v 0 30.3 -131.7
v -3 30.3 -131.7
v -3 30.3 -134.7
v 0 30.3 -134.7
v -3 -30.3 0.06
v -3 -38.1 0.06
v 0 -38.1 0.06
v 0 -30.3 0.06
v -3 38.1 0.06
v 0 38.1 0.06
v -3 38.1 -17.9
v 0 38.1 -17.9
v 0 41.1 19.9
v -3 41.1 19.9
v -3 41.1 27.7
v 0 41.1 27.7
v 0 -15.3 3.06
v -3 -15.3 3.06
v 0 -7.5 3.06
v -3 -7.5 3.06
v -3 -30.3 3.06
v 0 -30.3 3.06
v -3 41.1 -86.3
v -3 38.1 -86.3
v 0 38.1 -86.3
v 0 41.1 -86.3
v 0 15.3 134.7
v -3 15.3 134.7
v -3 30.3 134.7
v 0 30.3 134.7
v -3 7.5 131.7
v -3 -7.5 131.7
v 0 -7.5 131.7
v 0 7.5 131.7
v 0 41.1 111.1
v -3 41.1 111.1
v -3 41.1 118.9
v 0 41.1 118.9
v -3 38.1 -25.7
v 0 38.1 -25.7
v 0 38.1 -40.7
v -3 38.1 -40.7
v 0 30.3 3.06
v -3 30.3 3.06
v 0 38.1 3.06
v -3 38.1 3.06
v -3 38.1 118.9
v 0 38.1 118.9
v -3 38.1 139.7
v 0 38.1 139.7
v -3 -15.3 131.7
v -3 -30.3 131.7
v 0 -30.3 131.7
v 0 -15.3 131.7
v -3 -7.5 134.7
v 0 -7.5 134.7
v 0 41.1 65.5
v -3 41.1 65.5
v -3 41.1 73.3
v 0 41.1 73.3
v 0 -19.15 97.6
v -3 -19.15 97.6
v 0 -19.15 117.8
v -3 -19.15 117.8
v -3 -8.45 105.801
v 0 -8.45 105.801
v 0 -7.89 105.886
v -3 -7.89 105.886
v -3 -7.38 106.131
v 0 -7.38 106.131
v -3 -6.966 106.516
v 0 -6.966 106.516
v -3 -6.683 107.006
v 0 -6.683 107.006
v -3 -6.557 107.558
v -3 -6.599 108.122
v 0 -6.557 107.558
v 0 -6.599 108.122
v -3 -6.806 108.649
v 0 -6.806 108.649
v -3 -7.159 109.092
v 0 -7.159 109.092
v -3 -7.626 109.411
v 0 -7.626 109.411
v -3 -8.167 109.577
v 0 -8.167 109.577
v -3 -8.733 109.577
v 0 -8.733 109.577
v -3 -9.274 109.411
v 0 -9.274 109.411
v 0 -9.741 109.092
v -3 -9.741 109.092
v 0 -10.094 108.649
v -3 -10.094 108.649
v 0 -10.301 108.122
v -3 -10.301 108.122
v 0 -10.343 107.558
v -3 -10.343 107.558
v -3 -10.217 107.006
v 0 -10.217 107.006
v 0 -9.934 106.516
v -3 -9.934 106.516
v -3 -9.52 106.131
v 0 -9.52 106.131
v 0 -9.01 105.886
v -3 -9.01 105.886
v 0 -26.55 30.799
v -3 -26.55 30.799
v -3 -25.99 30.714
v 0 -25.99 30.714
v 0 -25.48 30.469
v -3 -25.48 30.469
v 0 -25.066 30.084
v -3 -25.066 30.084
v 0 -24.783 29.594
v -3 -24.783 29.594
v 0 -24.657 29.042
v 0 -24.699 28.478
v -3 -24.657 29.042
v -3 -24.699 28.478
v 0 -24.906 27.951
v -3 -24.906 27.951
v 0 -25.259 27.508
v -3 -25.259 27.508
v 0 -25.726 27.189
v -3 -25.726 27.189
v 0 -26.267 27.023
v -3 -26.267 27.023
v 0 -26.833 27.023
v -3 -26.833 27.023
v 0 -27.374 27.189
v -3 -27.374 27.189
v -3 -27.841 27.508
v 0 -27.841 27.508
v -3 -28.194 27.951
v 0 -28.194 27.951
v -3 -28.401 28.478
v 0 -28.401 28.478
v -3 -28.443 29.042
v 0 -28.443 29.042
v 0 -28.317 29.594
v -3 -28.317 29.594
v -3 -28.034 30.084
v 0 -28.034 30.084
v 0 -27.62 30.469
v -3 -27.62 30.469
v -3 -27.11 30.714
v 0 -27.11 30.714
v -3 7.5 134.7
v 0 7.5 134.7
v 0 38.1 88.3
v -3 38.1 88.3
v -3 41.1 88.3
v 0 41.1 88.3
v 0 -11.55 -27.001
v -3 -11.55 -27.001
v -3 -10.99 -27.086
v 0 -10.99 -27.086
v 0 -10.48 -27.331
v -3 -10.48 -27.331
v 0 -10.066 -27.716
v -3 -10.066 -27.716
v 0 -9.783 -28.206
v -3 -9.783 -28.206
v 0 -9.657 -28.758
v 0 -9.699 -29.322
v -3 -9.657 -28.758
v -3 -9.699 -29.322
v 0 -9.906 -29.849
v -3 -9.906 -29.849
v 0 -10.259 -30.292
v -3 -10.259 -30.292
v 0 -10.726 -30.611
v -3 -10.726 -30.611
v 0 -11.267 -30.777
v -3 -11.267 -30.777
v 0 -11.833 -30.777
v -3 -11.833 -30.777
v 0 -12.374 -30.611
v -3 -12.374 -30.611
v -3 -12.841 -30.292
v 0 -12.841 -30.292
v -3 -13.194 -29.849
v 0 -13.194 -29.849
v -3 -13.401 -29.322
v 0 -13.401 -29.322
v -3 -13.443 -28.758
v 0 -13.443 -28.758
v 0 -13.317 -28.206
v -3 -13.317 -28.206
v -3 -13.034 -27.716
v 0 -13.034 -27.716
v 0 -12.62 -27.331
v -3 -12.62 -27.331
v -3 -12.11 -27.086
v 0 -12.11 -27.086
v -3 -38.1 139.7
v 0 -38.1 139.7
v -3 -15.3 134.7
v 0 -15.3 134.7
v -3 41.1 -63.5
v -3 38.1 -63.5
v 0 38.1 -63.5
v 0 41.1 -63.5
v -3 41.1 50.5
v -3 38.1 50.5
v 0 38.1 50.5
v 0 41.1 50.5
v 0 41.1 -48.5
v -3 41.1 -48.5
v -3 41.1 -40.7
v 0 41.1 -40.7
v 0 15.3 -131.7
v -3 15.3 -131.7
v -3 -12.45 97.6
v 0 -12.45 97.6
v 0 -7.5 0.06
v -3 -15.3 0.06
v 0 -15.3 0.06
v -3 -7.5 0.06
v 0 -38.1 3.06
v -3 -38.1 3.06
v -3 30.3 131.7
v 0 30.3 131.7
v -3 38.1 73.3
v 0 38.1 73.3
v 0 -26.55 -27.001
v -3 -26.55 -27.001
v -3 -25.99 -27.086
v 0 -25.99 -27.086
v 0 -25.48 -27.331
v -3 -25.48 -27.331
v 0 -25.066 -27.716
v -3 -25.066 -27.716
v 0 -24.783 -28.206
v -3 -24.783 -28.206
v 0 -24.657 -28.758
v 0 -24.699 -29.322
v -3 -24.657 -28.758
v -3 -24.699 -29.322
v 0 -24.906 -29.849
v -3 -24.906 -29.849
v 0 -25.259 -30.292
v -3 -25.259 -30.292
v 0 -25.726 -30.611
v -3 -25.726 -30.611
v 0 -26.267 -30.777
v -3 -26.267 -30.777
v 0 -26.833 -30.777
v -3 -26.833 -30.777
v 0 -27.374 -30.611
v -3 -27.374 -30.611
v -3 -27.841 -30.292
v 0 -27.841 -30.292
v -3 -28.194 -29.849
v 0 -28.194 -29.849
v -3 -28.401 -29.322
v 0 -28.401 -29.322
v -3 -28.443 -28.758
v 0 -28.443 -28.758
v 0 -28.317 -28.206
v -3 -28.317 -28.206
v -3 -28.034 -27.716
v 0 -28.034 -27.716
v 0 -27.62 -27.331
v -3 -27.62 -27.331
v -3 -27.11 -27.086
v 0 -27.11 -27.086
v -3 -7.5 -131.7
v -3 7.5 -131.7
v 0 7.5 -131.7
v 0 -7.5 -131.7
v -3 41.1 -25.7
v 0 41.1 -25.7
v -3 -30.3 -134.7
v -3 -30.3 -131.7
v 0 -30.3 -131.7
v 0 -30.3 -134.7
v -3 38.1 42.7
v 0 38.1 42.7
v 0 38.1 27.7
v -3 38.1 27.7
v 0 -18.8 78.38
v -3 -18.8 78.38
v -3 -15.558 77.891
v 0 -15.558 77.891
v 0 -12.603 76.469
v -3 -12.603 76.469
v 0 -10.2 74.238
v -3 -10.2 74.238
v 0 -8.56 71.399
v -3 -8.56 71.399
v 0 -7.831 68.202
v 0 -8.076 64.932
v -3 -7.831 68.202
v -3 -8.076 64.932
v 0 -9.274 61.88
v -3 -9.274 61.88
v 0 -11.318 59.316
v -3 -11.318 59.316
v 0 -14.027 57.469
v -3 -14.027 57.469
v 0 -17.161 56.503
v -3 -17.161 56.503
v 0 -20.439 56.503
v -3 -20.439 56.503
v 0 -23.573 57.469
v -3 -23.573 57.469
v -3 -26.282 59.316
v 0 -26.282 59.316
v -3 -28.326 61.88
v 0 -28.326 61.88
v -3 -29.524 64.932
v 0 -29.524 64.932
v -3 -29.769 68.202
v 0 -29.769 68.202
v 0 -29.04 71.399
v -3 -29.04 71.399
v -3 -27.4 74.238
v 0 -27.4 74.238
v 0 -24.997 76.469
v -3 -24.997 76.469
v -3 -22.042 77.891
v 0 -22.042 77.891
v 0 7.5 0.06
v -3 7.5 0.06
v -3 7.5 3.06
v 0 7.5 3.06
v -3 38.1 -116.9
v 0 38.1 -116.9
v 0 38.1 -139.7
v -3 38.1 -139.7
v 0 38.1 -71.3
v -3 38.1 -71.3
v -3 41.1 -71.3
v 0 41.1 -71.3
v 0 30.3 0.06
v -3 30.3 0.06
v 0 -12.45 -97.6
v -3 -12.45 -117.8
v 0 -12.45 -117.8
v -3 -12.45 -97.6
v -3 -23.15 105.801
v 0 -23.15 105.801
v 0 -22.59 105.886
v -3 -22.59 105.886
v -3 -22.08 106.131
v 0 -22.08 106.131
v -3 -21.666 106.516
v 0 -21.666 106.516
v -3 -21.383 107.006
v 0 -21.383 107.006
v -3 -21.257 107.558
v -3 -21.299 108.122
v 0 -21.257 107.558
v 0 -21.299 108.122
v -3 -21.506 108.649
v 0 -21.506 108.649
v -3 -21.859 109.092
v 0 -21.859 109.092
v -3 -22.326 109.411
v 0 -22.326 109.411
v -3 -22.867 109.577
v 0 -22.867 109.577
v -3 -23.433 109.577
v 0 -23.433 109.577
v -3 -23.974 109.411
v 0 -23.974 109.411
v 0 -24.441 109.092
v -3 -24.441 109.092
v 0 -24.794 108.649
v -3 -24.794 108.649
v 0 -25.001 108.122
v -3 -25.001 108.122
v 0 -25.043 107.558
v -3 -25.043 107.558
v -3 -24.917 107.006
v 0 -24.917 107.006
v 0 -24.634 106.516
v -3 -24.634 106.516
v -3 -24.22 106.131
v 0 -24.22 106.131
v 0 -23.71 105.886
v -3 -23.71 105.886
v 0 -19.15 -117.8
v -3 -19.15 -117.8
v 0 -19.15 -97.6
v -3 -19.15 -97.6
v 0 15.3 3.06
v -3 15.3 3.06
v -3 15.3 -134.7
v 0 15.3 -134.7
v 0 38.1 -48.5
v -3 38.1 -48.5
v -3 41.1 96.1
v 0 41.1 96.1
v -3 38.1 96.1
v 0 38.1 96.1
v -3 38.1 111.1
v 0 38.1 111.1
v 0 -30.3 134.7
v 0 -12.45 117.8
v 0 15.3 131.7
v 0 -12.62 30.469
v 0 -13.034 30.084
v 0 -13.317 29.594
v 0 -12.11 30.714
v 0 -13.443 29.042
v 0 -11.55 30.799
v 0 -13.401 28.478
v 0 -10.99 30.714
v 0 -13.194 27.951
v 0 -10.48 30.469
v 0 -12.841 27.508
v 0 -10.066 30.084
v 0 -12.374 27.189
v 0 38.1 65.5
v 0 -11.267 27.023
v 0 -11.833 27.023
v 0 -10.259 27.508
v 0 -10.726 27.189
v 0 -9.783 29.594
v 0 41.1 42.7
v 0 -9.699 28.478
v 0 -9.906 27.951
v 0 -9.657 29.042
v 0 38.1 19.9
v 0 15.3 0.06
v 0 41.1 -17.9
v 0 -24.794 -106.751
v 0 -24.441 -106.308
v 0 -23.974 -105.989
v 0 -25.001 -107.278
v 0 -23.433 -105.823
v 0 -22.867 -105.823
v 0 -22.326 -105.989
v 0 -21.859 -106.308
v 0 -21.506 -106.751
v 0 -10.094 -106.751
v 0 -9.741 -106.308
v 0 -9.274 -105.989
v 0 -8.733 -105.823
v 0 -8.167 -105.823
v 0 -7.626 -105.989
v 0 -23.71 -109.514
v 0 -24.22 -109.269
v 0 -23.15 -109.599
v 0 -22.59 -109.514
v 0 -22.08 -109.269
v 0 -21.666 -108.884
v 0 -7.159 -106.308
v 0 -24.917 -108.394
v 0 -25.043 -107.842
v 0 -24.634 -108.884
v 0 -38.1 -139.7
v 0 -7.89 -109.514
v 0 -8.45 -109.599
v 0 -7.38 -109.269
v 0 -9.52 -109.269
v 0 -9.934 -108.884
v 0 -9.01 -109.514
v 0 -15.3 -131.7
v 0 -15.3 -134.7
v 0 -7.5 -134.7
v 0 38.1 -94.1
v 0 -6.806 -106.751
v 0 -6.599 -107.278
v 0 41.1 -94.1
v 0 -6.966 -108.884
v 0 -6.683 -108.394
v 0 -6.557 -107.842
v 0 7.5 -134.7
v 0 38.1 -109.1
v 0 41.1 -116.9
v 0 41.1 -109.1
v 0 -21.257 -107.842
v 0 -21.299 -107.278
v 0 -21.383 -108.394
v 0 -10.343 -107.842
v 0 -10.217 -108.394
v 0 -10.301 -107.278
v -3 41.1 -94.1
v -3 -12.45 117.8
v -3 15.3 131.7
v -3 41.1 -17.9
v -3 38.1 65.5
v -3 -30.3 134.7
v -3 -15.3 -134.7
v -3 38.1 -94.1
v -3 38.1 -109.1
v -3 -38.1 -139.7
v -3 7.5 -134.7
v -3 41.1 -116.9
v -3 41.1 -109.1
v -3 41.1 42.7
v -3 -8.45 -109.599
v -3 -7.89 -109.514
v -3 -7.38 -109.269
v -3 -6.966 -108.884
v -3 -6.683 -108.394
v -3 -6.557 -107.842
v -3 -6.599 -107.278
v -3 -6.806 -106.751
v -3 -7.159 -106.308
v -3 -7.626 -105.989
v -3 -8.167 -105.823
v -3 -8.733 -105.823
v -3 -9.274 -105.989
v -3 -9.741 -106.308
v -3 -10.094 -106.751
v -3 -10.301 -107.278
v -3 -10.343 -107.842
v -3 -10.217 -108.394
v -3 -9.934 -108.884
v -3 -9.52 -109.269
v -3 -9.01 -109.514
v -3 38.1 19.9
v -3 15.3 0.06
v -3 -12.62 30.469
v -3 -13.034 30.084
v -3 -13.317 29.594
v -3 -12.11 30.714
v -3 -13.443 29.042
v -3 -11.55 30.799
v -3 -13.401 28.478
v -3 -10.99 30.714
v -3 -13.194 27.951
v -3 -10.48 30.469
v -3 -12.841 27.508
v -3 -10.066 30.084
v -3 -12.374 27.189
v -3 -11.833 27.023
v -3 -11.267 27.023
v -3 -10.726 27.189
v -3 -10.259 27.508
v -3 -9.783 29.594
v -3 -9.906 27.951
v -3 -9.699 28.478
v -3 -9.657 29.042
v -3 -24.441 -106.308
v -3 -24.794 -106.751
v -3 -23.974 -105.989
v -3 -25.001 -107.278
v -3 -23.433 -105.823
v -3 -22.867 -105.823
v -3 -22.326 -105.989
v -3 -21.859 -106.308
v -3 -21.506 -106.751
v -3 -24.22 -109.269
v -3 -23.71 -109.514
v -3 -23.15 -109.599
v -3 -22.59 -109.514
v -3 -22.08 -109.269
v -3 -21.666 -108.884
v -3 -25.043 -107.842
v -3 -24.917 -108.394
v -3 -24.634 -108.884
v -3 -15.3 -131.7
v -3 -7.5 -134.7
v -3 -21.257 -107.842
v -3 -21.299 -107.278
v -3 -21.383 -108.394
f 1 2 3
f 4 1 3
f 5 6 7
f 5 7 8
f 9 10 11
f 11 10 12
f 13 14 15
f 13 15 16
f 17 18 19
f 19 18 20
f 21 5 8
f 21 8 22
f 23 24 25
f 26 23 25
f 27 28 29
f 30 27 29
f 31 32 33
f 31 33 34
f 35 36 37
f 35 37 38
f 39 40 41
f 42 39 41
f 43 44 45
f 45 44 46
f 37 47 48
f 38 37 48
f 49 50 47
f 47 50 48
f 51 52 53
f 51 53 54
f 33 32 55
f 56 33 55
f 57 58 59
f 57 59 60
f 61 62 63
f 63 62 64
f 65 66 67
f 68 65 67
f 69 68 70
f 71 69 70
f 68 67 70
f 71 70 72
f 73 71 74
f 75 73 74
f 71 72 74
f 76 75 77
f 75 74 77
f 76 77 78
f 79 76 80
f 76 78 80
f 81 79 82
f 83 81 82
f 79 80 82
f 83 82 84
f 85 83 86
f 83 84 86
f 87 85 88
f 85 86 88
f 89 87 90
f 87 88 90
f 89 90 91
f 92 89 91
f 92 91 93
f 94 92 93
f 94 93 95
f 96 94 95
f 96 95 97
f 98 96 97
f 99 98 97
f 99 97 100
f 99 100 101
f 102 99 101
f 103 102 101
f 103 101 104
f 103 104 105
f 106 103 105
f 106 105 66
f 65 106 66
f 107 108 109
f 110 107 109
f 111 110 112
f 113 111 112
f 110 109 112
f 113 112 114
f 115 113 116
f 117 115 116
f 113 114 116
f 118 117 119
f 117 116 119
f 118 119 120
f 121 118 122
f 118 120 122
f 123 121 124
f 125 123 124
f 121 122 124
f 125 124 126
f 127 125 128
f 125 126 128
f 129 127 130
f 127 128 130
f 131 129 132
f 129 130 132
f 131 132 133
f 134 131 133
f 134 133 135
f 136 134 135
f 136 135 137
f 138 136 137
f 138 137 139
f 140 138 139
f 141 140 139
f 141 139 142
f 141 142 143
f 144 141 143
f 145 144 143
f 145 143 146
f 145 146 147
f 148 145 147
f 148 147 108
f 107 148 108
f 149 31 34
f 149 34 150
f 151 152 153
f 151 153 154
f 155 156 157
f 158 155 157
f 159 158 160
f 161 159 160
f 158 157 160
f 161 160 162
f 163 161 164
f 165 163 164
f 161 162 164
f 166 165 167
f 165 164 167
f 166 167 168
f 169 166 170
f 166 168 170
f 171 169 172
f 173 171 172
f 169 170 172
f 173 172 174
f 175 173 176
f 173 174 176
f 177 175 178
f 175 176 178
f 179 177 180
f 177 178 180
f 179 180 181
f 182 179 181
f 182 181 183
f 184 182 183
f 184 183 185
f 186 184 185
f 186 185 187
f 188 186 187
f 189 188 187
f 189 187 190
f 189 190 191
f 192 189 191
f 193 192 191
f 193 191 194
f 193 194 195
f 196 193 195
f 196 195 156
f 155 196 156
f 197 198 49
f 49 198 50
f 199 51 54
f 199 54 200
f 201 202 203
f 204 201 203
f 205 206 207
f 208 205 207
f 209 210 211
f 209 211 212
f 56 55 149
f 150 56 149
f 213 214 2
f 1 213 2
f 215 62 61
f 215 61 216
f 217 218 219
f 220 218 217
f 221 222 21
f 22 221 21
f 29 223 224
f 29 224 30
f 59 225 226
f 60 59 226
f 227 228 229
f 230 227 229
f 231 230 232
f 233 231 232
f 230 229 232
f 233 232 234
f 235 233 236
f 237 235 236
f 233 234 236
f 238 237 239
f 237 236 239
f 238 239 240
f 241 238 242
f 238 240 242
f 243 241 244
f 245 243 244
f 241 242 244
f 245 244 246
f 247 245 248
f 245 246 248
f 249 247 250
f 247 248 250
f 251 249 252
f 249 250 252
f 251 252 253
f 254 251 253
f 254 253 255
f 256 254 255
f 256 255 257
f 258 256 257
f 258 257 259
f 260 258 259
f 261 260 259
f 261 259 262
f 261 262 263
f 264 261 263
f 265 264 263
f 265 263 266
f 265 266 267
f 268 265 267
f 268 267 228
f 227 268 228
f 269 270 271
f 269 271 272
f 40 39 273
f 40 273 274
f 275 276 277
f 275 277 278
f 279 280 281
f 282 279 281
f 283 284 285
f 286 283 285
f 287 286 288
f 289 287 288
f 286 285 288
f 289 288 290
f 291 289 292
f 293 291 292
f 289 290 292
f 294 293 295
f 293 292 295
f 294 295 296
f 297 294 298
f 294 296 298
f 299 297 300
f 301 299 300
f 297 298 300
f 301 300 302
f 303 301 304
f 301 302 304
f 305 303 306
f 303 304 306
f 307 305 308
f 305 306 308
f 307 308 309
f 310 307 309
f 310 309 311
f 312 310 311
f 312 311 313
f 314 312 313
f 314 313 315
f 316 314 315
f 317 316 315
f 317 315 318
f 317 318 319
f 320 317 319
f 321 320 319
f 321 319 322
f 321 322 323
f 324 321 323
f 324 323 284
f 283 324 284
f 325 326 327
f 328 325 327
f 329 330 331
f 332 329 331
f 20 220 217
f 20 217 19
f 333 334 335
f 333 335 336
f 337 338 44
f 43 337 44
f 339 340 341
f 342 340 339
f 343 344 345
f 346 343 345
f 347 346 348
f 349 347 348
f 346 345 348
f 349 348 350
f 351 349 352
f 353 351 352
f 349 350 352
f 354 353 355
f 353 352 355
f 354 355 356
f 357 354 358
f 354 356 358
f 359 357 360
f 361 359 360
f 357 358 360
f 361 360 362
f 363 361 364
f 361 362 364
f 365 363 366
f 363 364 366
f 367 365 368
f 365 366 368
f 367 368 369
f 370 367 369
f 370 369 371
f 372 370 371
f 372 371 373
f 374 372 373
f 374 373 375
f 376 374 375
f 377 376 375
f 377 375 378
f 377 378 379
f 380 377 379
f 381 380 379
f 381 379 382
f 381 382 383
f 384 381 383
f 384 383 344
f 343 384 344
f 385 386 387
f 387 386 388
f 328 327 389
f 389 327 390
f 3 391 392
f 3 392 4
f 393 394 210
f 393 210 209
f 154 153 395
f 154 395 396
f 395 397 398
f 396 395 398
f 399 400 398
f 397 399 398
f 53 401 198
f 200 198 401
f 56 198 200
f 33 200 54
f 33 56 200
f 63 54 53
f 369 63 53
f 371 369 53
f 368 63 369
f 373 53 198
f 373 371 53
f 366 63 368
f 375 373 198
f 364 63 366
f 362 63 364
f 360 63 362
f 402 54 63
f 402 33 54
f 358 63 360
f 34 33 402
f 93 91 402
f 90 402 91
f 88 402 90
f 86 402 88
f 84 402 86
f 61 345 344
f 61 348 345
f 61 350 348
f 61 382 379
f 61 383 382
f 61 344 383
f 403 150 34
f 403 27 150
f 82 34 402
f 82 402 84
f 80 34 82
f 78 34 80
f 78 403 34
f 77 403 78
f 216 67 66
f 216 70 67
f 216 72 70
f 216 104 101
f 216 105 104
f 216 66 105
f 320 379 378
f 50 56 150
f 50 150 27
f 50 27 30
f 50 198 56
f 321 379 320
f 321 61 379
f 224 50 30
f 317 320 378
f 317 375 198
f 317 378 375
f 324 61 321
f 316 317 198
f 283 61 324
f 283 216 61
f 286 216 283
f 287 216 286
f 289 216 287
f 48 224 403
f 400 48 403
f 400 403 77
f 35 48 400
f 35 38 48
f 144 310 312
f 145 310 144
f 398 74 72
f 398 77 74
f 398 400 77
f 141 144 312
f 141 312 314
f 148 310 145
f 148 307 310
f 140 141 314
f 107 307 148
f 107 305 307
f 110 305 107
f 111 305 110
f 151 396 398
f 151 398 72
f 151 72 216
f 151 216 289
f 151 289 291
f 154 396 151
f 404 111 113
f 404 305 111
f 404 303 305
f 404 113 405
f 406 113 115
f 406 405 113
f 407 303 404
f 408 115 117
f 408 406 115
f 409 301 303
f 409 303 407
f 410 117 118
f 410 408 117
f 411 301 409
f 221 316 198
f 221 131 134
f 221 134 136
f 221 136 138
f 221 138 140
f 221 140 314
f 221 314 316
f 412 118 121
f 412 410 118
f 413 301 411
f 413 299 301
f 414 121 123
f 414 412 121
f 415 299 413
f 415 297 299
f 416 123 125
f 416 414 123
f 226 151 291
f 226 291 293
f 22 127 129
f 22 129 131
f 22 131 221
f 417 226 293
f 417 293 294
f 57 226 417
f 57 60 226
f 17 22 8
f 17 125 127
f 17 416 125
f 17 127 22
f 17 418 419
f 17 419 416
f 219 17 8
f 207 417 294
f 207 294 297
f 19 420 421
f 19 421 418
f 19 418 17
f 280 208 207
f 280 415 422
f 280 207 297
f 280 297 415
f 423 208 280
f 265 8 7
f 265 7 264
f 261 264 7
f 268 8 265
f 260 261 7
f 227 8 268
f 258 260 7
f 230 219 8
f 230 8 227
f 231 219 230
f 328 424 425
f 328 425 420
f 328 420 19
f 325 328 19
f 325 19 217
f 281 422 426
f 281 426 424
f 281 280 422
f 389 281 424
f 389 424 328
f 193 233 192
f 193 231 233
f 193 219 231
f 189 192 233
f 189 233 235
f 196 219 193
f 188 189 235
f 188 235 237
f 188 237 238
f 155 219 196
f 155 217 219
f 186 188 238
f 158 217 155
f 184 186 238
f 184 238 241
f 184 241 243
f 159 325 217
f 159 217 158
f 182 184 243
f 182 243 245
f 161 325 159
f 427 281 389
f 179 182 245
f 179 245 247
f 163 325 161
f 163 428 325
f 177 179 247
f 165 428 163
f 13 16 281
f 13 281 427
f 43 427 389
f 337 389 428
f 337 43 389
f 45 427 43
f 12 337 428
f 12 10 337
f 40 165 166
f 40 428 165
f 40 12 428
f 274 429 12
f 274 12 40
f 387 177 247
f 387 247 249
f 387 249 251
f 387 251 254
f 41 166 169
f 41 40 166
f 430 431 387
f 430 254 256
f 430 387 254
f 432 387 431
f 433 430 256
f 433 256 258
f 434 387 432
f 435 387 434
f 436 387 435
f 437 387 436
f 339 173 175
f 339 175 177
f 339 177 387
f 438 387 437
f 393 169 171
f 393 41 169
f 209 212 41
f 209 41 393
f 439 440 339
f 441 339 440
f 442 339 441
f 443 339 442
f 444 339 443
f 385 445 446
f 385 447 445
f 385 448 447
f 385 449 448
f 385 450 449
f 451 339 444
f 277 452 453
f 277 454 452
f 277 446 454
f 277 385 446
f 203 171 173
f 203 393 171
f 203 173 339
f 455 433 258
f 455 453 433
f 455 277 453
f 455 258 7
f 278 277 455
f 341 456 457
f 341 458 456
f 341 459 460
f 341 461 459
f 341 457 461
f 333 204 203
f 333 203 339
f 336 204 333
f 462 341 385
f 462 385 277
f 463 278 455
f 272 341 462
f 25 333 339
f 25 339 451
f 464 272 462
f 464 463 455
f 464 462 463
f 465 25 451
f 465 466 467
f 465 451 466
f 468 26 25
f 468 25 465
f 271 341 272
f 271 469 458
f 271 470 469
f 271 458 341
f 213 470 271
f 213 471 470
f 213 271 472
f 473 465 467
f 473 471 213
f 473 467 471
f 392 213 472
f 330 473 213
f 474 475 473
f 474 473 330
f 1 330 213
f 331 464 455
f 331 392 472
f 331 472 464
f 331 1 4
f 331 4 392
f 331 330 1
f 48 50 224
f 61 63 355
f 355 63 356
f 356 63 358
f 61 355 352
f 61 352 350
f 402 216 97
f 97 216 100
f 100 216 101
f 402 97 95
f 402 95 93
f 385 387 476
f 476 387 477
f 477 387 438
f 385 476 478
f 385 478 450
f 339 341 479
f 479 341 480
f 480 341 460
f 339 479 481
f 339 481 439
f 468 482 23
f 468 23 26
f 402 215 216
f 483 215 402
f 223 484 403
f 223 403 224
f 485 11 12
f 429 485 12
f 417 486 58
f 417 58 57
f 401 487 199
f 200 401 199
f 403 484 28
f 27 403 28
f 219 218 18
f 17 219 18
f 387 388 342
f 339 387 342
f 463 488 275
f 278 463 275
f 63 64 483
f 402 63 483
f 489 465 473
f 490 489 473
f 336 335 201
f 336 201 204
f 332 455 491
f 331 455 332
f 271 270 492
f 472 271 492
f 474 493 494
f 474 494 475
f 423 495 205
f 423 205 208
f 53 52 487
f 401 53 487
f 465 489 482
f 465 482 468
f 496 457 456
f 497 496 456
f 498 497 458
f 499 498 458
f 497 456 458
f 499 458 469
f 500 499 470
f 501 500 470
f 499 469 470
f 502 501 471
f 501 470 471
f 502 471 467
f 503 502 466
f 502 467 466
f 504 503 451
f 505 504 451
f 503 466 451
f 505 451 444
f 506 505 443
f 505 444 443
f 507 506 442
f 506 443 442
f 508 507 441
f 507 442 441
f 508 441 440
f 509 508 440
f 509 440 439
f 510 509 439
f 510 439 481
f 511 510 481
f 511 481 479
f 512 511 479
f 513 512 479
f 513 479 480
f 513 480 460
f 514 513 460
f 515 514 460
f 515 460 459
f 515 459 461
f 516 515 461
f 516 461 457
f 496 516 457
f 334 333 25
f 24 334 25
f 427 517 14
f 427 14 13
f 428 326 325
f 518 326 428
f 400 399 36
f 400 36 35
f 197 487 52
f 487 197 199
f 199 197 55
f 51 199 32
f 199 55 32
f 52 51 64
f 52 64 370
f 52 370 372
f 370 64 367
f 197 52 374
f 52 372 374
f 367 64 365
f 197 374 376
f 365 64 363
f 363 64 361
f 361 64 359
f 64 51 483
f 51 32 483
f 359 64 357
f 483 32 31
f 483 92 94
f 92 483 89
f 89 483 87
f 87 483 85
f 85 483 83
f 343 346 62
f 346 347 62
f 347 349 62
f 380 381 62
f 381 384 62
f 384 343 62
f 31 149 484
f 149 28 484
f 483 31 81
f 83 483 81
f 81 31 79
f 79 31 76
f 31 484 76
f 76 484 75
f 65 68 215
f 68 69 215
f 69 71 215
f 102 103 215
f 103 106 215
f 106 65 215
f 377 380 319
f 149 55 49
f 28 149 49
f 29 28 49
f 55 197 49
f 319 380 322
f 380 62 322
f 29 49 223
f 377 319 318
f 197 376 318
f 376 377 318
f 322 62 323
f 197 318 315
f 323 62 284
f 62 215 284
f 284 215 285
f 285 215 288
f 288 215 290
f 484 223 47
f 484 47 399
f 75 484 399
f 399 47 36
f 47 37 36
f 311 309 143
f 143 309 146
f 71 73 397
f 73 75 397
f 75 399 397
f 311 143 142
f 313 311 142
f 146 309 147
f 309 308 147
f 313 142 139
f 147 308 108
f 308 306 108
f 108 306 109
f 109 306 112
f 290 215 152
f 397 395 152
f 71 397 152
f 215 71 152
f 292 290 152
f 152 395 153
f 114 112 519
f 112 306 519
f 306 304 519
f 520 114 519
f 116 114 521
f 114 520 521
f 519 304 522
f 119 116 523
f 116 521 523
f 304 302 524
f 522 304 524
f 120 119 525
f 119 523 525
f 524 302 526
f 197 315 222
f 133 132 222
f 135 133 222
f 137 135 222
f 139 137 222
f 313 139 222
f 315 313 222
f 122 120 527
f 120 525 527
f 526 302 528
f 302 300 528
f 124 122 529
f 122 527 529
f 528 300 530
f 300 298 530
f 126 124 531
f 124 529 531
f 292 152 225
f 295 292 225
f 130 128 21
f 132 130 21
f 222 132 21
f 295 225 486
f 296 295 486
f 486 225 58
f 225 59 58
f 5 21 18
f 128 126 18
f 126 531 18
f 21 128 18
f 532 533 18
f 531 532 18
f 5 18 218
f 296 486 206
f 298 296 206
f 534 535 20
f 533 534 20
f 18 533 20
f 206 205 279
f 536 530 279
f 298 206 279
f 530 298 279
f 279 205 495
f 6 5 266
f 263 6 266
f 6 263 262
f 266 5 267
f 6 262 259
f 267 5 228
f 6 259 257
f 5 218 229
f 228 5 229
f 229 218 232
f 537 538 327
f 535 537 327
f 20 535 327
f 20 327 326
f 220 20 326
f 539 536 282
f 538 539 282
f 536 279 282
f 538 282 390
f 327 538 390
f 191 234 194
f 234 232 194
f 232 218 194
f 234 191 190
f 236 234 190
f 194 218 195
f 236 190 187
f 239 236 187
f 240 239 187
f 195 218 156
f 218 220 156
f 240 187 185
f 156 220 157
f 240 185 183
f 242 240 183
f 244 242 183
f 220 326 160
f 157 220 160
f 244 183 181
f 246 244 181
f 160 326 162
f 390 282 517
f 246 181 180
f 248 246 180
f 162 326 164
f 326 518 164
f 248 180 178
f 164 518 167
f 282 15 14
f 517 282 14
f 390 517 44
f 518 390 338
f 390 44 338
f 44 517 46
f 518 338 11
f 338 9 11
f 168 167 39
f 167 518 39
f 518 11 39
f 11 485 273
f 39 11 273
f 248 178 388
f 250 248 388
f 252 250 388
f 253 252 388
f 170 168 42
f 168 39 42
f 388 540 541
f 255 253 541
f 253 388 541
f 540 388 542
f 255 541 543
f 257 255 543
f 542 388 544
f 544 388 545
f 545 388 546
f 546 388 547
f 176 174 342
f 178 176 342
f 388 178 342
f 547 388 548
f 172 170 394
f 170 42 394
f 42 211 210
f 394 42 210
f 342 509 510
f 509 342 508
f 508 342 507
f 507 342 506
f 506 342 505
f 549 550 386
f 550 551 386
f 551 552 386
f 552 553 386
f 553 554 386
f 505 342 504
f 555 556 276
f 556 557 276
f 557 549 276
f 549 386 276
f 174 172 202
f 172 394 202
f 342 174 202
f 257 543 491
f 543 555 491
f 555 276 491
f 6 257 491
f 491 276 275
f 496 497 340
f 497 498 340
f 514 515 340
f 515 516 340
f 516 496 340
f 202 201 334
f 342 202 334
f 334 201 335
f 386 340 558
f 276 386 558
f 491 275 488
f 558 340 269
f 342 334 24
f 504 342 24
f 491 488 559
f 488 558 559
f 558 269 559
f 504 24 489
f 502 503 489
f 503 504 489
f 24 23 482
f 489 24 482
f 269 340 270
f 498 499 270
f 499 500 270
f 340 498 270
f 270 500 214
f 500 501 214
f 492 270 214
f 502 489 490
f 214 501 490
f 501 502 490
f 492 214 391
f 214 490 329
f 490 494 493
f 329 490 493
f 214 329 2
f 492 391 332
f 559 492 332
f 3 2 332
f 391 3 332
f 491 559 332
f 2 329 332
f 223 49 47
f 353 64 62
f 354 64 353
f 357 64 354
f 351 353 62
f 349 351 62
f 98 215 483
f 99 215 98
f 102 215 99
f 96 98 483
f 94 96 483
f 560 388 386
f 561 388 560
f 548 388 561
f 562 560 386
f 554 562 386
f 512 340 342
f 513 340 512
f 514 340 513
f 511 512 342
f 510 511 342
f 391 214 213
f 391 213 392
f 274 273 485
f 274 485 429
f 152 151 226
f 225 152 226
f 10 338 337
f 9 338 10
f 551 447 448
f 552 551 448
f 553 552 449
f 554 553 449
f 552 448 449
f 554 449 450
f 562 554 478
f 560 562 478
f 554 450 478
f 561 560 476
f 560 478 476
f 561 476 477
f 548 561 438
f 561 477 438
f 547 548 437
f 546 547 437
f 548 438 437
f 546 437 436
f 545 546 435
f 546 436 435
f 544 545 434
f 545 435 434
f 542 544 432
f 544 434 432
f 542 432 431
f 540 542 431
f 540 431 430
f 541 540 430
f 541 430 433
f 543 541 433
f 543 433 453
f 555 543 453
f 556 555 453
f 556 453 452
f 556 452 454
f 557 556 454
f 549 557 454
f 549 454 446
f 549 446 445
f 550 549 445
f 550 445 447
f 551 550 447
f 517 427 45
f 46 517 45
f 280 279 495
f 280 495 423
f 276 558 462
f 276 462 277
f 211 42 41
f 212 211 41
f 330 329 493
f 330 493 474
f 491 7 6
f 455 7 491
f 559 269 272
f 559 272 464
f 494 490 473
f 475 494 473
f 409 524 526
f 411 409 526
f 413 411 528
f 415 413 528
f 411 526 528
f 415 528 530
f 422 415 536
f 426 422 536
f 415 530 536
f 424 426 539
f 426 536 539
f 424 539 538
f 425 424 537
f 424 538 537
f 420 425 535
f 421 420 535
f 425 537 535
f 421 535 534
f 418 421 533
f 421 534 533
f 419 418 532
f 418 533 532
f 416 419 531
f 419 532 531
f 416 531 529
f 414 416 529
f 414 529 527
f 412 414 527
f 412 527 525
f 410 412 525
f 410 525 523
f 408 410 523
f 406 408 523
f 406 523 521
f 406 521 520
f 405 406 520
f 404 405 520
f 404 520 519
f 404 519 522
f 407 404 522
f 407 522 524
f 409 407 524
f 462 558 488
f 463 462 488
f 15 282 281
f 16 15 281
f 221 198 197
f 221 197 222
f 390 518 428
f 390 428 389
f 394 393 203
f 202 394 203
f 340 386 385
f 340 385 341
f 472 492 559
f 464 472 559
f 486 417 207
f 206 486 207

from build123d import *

# Parameters (mm, degrees)
SKETCH1_W               = 279.4
SKETCH1_H               = 76.2
BOSS_EXTRUDE1_DEPTH     = 3
SKETCH3_W               = 3
SKETCH3_H               = 15
CUT_EXTRUDE1_DEPTH      = 145.833352512
LPATTERN1_COUNT         = 3
LPATTERN1_PITCH         = 22.8
MIRROR1_COPY_1_SKETCH_W = 3
MIRROR1_COPY_1_SKETCH_H = 15
MIRROR1_COPY_1_DEPTH    = 145.833352512
MIRROR1_COPY_2_SKETCH_W = 3
MIRROR1_COPY_2_SKETCH_H = 15
MIRROR1_COPY_2_DEPTH    = 145.833352512
SKETCH6_W               = 3
SKETCH6_H               = 7.8
CUT_EXTRUDE2_DEPTH      = 145.833352512
LPATTERN2_COUNT         = 4
LPATTERN2_PITCH         = 22.8
SKETCH8_W               = 3
SKETCH8_H               = 7.8
BOSS_EXTRUDE2_DEPTH     = 3
LPATTERN4_COUNT         = 11
LPATTERN4_PITCH         = 22.8
SKETCH9_R               = 11
CUT_EXTRUDE3_DEPTH      = 146.651295909
F_6_CLEARANCE_HOLE1_D   = 3.7973
CUT_EXTRUDE4_REACH      = 147.651
SKETCH12_W              = 20.2
SKETCH12_H              = 6.7
F_6_CLEARANCE_HOLE2_D   = 3.7973


with BuildPart() as part:
    # Sketch1 → Boss-Extrude1 (new body)
    with BuildSketch(Plane(origin=(0, 0, 0), x_dir=(0, 0, -1), z_dir=(1, 0, 0))):
        Rectangle(SKETCH1_W, SKETCH1_H)
    extrude(amount=-BOSS_EXTRUDE1_DEPTH)

    # Sketch3 → Cut-Extrude1 (cut, through all)
    with BuildSketch(Plane.ZY.offset(3)):
        with Locations((133.2, 22.8)):
            Rectangle(SKETCH3_W, SKETCH3_H)
    cut_extrude1 = extrude(amount=-CUT_EXTRUDE1_DEPTH, mode=Mode.SUBTRACT)

    # LPattern1: Cut-Extrude1 ×3
    with Locations(*[(0, -i * LPATTERN1_PITCH, 0) for i in range(1, LPATTERN1_COUNT)]):
        add(cut_extrude1, mode=Mode.SUBTRACT)

    # Mirror1: Cut-Extrude1 across plane
    add(cut_extrude1.mirror(Plane.XY), mode=Mode.SUBTRACT)

    # Mirror1 copy 1 sketch → Mirror1 copy 1 (cut, through all)
    with BuildSketch(Plane(origin=(-3, -22.8, 0), x_dir=(0, 0, -1), z_dir=(-1, 0, 0))):
        with Locations((133.2, -22.8)):
            Rectangle(MIRROR1_COPY_1_SKETCH_W, MIRROR1_COPY_1_SKETCH_H)
    extrude(amount=-MIRROR1_COPY_1_DEPTH, mode=Mode.SUBTRACT)

    # Mirror1 copy 2 sketch → Mirror1 copy 2 (cut, through all)
    with BuildSketch(Plane(origin=(-3, -45.6, 0), x_dir=(0, 0, -1), z_dir=(-1, 0, 0))):
        with Locations((133.2, -22.8)):
            Rectangle(MIRROR1_COPY_2_SKETCH_W, MIRROR1_COPY_2_SKETCH_H)
    extrude(amount=-MIRROR1_COPY_2_DEPTH, mode=Mode.SUBTRACT)

    # Sketch6 → Cut-Extrude2 (cut, through all)
    with BuildSketch(Plane.ZY.offset(3)):
        with Locations((1.56, 34.2)):
            Rectangle(SKETCH6_W, SKETCH6_H)
    cut_extrude2 = extrude(amount=-CUT_EXTRUDE2_DEPTH, mode=Mode.SUBTRACT)

    # LPattern2: Cut-Extrude2 ×4
    with Locations(*[(0, -i * LPATTERN2_PITCH, 0) for i in range(1, LPATTERN2_COUNT)]):
        add(cut_extrude2, mode=Mode.SUBTRACT)

    # Sketch8 → Boss-Extrude2 (add)
    with BuildSketch(Plane(origin=(0, 38.1, 0), x_dir=(1, 0, 0), z_dir=(0, 1, 0))):
        with Locations((-1.5, 113)):
            Rectangle(SKETCH8_W, SKETCH8_H)
    boss_extrude2 = extrude(amount=BOSS_EXTRUDE2_DEPTH)

    # LPattern4: Boss-Extrude2 ×11, 1 skipped
    with Locations(*[(0, 0, i * LPATTERN4_PITCH) for i in range(1, LPATTERN4_COUNT) if i not in (5,)]):
        add(boss_extrude2)

    # Sketch9 → Cut-Extrude3 (cut, through all)
    with BuildSketch(Plane.ZY.offset(3)):
        with Locations((67.38, -18.8)):
            Circle(SKETCH9_R)
    extrude(amount=-CUT_EXTRUDE3_DEPTH, mode=Mode.SUBTRACT)

    # #6 Clearance Hole1 (through all)
    with Locations(Plane(origin=(0, 0, 0), x_dir=(0, 0, -1), z_dir=(1, 0, 0))):
        with Locations((28.9, -26.55), (28.9, -11.55), (-28.9, -11.55), (-28.9, -26.55)):
            Hole(F_6_CLEARANCE_HOLE1_D / 2)

    # Sketch12 → Cut-Extrude4 (cut, up to next)
    with BuildSketch(Plane.ZY.offset(3), mode=Mode.PRIVATE) as cut_extrude4_sk1:
        with Locations((-107.7, -15.8)):
            Rectangle(SKETCH12_W, SKETCH12_H)
    cut_extrude4_tool1 = extrude(cut_extrude4_sk1.sketch, amount=-CUT_EXTRUDE4_REACH, mode=Mode.PRIVATE) & part.part
    # Sketch12 → Cut-Extrude4 (cut, up to next)
    with BuildSketch(Plane.ZY.offset(3), mode=Mode.PRIVATE) as cut_extrude4_sk2:
        with Locations((107.7, -15.8)):
            Rectangle(SKETCH12_W, SKETCH12_H)
    cut_extrude4_tool2 = extrude(cut_extrude4_sk2.sketch, amount=-CUT_EXTRUDE4_REACH, mode=Mode.PRIVATE) & part.part
    add(cut_extrude4_tool1.solids().sort_by_distance((-3, -15.8, -107.7))[0], mode=Mode.SUBTRACT)
    add(cut_extrude4_tool2.solids().sort_by_distance((-3, -15.8, 107.7))[0], mode=Mode.SUBTRACT)

    # #6 Clearance Hole2 (through all)
    with Locations(Plane.ZY.offset(3)):
        with Locations((-107.7, -23.15), (-107.7, -8.45), (107.7, -23.15), (107.7, -8.45)):
            Hole(F_6_CLEARANCE_HOLE2_D / 2)


solid = part.part
